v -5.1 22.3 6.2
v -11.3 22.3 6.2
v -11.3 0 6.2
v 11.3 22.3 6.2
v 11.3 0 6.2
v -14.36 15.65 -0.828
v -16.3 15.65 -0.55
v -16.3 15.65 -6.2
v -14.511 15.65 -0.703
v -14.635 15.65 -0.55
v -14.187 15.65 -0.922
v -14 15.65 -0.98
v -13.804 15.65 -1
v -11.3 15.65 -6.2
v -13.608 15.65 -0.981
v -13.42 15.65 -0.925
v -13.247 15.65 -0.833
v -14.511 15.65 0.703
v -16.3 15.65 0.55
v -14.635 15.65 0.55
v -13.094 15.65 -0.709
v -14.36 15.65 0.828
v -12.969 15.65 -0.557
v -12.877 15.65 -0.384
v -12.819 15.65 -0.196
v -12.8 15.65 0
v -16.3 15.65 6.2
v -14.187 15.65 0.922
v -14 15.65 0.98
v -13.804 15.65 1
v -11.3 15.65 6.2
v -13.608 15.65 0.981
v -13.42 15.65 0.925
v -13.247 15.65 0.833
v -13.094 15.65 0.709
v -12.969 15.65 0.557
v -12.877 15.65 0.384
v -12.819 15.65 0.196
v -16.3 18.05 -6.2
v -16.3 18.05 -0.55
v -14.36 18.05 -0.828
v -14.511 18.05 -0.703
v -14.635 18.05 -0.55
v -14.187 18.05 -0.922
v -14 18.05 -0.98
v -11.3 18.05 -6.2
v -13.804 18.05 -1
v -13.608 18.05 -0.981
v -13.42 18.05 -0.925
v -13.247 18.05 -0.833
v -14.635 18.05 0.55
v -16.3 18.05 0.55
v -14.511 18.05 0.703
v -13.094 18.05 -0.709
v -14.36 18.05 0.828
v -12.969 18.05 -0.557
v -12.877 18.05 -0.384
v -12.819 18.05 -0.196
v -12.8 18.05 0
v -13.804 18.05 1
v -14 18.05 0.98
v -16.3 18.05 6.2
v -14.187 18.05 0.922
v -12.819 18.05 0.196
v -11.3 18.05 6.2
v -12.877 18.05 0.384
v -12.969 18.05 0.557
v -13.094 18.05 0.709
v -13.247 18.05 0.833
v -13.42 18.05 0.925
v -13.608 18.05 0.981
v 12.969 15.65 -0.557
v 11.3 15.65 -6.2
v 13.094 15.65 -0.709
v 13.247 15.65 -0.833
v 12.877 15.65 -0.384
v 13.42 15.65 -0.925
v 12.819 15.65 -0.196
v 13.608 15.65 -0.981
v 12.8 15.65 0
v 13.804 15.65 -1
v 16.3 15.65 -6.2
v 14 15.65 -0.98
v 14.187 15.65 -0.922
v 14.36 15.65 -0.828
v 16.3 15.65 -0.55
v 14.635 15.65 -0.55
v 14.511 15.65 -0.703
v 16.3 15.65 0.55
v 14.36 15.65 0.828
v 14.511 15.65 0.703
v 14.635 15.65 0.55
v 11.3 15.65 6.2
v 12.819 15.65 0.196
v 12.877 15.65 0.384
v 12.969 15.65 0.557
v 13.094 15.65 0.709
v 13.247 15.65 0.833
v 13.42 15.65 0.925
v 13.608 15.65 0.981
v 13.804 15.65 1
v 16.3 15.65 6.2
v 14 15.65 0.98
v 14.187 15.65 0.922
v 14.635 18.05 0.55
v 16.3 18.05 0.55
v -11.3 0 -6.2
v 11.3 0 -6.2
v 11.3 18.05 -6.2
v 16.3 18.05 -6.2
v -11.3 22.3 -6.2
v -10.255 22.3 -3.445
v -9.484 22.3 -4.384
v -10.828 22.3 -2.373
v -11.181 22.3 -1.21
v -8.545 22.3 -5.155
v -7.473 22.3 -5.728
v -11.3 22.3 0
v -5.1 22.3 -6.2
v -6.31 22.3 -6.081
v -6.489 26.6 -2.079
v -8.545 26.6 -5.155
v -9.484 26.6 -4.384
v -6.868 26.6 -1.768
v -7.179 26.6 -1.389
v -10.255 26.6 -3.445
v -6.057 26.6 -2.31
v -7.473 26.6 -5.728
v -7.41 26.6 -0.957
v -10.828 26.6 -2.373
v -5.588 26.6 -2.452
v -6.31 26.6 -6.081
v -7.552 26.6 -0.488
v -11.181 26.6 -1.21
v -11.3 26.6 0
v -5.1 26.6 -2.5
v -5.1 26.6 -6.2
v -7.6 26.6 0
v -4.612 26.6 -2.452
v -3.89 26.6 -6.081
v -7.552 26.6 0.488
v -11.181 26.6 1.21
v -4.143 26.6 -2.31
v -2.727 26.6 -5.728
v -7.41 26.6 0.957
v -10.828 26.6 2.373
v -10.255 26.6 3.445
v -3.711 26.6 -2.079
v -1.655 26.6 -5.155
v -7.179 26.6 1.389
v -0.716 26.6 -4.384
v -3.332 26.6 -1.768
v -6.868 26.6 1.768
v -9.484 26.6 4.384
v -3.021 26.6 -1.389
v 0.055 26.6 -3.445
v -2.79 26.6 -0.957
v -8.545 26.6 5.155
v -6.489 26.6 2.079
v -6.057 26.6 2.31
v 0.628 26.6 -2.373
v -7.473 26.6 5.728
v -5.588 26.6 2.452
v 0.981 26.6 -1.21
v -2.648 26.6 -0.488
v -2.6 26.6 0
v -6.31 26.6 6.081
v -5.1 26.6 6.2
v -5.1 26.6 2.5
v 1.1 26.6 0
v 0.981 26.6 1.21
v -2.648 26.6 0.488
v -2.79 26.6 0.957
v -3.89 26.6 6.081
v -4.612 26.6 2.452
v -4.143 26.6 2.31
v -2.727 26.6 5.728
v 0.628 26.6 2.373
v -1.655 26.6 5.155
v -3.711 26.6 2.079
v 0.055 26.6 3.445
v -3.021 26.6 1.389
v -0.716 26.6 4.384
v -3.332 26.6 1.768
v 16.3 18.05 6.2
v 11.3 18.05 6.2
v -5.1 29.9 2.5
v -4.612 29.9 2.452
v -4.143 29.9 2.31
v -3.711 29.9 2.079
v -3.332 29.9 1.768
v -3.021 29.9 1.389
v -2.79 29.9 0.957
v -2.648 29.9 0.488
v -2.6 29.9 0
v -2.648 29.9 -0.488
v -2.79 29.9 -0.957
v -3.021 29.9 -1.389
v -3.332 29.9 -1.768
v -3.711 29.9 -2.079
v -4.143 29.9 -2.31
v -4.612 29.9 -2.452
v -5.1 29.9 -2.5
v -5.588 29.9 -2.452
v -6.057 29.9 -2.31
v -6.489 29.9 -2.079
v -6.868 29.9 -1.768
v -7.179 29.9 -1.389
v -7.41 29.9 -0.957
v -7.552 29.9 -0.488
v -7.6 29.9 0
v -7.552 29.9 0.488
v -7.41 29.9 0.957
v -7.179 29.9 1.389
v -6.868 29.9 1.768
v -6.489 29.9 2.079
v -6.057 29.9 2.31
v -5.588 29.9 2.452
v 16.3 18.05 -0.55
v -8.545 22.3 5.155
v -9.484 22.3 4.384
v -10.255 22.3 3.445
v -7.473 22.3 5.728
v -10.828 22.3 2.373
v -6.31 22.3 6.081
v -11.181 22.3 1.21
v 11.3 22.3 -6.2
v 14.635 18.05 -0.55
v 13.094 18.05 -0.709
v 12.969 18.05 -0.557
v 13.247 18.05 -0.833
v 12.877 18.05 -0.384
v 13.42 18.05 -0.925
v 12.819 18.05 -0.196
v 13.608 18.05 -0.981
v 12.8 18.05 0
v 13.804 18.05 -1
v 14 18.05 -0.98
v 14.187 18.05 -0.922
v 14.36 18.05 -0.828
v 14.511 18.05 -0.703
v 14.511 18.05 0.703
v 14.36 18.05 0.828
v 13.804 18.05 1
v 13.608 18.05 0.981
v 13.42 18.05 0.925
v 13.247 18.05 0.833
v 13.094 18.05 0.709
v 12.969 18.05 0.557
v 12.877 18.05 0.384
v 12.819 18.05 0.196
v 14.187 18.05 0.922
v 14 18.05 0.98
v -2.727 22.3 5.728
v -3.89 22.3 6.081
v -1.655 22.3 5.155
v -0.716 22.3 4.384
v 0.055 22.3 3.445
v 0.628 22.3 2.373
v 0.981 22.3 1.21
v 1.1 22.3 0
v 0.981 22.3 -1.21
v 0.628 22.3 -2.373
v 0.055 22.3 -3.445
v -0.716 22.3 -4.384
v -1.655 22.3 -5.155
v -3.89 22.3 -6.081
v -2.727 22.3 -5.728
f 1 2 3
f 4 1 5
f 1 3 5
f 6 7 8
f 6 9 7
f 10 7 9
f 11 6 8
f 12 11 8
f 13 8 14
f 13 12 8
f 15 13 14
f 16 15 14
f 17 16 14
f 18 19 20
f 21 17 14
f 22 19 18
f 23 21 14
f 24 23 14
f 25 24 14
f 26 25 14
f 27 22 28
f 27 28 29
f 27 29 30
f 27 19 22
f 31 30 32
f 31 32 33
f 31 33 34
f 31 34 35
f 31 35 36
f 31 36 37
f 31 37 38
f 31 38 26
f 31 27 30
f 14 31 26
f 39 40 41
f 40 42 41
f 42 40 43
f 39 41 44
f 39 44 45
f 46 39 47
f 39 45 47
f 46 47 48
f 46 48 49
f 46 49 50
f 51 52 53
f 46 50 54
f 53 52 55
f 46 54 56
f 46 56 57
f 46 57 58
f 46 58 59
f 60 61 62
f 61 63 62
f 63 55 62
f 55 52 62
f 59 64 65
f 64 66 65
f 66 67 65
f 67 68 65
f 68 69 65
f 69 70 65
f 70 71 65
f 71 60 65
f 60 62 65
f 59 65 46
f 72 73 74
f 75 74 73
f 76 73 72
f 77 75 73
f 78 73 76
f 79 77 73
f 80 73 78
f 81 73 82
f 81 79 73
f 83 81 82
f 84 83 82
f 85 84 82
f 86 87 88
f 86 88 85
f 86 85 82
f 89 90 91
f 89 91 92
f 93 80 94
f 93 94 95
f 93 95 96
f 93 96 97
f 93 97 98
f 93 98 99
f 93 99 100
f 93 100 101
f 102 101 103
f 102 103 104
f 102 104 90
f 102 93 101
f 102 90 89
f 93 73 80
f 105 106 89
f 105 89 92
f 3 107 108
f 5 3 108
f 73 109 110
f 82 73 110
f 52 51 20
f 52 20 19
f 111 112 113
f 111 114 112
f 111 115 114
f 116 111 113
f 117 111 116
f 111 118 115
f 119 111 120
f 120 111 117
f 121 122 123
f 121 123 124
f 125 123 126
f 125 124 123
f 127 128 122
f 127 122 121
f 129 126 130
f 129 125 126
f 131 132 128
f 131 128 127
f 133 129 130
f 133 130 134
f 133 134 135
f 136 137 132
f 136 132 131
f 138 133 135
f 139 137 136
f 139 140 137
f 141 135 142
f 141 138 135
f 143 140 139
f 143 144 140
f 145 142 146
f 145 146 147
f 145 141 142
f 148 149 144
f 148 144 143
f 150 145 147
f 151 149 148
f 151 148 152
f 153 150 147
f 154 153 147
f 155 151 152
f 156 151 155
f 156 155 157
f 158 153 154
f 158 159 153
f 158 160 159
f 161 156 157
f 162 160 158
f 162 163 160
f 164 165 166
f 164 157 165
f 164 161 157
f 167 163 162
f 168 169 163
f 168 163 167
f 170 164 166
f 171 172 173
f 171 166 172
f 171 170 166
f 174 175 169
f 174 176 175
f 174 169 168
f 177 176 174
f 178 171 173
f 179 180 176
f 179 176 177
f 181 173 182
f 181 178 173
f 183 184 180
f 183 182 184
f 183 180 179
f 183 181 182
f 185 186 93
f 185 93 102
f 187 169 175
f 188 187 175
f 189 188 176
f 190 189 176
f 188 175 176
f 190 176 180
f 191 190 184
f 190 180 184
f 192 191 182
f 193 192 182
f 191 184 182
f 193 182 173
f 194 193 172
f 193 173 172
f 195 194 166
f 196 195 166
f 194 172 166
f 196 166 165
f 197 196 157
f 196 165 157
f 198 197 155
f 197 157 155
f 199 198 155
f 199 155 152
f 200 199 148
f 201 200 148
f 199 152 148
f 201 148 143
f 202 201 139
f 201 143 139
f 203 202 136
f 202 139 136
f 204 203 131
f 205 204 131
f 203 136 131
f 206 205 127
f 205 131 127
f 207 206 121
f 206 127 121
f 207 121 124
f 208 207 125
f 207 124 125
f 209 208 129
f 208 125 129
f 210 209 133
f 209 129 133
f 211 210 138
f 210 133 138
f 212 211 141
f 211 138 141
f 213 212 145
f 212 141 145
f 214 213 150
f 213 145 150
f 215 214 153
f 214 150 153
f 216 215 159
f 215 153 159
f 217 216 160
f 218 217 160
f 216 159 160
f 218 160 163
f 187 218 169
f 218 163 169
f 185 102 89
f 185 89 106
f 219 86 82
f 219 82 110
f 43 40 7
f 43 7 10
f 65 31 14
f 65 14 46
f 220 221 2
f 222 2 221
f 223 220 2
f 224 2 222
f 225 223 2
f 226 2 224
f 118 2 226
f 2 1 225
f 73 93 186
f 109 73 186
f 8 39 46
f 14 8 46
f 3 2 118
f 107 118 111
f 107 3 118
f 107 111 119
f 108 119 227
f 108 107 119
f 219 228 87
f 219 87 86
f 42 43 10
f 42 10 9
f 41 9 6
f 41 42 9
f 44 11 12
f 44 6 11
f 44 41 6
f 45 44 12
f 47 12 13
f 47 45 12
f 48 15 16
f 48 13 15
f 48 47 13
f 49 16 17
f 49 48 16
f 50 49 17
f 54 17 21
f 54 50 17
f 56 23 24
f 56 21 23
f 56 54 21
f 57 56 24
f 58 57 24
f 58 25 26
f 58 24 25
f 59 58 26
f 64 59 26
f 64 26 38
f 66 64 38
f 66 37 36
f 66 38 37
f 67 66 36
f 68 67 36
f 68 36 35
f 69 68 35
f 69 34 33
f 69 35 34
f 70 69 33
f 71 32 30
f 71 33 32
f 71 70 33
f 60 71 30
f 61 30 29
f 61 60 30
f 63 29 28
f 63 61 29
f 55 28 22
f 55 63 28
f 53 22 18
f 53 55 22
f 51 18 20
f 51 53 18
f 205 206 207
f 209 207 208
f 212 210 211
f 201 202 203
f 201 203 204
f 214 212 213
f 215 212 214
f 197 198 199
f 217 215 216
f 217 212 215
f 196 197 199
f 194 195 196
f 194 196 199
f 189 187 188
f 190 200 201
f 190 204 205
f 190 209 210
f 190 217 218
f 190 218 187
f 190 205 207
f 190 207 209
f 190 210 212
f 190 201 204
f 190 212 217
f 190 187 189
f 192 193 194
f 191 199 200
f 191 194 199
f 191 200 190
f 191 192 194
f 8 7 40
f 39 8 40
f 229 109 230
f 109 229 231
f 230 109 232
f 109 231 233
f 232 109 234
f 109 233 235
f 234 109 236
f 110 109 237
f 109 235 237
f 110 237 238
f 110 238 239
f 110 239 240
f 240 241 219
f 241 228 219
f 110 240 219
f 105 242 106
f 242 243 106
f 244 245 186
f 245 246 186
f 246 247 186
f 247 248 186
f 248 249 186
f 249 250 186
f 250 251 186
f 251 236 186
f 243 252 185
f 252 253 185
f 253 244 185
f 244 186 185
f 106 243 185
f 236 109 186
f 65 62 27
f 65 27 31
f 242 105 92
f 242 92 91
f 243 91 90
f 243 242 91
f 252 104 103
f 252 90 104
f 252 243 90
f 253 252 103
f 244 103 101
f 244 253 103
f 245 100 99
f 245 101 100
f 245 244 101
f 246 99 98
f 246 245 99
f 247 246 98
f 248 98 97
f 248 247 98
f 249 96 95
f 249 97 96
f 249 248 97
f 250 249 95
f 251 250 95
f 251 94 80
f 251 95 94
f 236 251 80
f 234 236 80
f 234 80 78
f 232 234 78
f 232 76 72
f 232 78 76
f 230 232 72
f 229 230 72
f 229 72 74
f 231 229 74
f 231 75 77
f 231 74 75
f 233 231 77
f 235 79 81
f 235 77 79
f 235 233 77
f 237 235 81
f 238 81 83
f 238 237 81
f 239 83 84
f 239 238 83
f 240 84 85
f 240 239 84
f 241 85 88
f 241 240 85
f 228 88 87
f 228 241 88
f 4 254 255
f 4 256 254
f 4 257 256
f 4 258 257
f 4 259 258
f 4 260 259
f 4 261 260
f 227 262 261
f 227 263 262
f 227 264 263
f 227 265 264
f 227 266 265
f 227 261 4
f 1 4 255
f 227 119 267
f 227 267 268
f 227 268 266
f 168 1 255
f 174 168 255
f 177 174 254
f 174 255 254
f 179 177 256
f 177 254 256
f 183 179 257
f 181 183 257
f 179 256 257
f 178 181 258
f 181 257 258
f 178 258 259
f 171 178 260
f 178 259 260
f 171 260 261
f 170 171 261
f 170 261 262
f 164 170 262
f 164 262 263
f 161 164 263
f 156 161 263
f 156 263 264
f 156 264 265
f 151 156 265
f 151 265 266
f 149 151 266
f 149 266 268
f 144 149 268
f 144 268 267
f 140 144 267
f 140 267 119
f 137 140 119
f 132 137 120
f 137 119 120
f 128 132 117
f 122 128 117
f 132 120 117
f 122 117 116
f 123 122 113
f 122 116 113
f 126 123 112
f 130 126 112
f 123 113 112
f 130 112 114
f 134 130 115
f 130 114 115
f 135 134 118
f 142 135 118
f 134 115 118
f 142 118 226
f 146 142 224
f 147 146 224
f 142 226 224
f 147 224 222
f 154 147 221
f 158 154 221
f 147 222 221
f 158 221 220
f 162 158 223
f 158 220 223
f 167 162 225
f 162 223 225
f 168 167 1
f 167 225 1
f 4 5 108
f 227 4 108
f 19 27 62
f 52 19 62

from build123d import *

# Parameters (mm, degrees)
SKETCH_1_W          = 22.6
SKETCH_1_H          = 12.4
EXTRUDE_1_DEPTH     = 22.3
SKETCH_2_W          = 5
SKETCH_2_H          = 2.4
EXTRUDE_2_DEPTH     = 12.4
EXTRUDE_2_2_DEPTH   = 12.4
CUT_EXTRUDE_1_DEPTH = 26.098456128
SKETCH_4_R          = 6.2
EXTRUDE_3_DEPTH     = 4.3
SKETCH_5_R          = 2.5
EXTRUDE_4_DEPTH     = 3.3


with BuildPart() as part:
    # 草图1 → 凸台-拉伸1 (new body)
    with BuildSketch(Plane(origin=(0, 0, 0), x_dir=(1, 0, 0), z_dir=(0, 1, 0))):
        Rectangle(SKETCH_1_W, SKETCH_1_H)
    extrude(amount=EXTRUDE_1_DEPTH)

    # 草图4 → 凸台-拉伸3 (add)
    with BuildSketch(Plane(origin=(0, 22.3, 0), x_dir=(1, 0, 0), z_dir=(0, 1, 0))):
        with Locations(Location((-5.1, 0, 0), (0, 0, 270))):
            Circle(SKETCH_4_R)
    extrude(amount=EXTRUDE_3_DEPTH)

    # 草图5 → 凸台-拉伸4 (add)
    with BuildSketch(Plane(origin=(0, 26.6, 0), x_dir=(1, 0, 0), z_dir=(0, 1, 0))):
        with Locations(Location((-5.1, 0, 0), (0, 0, 270))):
            Circle(SKETCH_5_R)
    extrude(amount=EXTRUDE_4_DEPTH)


with BuildPart() as body_2:
    # 草图2 → 凸台-拉伸2 (new, through all)
    with BuildSketch(Plane.XY.offset(6.2)):
        with Locations((13.8, 16.85)):
            Rectangle(SKETCH_2_W, SKETCH_2_H)
    extrude(amount=-EXTRUDE_2_DEPTH)


with BuildPart() as body_3:
    # 草图2 → Extrude 2 2 (new, through all)
    with BuildSketch(Plane.XY.offset(6.2)):
        with Locations((-13.8, 16.85)):
            Rectangle(SKETCH_2_W, SKETCH_2_H)
    extrude(amount=-EXTRUDE_2_2_DEPTH)


with BuildPart() as cut_extrude_1_tool:
    # 草图3 → 切除-拉伸1 (new, through all)
    with BuildSketch(Plane(origin=(0, 18.05, 0), x_dir=(1, 0, 0), z_dir=(0, 1, 0))):
        with BuildLine():
            Line((14.635164654, 0.55), (16.3, 0.55))
            Line((16.3, 0.55), (16.3, -0.55))
            Line((16.3, -0.55), (14.635164654, -0.55))
            ThreePointArc((14.635164654, -0.55), (12.8, 0), (14.635164654, 0.55))
        make_face()
        with BuildLine():
            Line((-14.635164654, -0.55), (-16.3, -0.55))
            Line((-16.3, -0.55), (-16.3, 0.55))
            Line((-16.3, 0.55), (-14.635164654, 0.55))
            ThreePointArc((-14.635164654, 0.55), (-12.8, 0), (-14.635164654, -0.55))
        make_face()
    extrude(amount=-CUT_EXTRUDE_1_DEPTH)


with BuildPart() as body_2_1:
    add(body_2.part)

    # 切除-拉伸1: cut by cut_extrude_1_tool
    add(cut_extrude_1_tool.part, mode=Mode.SUBTRACT)


with BuildPart() as body_3_1:
    add(body_3.part)

    # 切除-拉伸1: cut by cut_extrude_1_tool
    add(cut_extrude_1_tool.part, mode=Mode.SUBTRACT)


solid = Compound([part.part, body_2_1.part, body_3_1.part])
